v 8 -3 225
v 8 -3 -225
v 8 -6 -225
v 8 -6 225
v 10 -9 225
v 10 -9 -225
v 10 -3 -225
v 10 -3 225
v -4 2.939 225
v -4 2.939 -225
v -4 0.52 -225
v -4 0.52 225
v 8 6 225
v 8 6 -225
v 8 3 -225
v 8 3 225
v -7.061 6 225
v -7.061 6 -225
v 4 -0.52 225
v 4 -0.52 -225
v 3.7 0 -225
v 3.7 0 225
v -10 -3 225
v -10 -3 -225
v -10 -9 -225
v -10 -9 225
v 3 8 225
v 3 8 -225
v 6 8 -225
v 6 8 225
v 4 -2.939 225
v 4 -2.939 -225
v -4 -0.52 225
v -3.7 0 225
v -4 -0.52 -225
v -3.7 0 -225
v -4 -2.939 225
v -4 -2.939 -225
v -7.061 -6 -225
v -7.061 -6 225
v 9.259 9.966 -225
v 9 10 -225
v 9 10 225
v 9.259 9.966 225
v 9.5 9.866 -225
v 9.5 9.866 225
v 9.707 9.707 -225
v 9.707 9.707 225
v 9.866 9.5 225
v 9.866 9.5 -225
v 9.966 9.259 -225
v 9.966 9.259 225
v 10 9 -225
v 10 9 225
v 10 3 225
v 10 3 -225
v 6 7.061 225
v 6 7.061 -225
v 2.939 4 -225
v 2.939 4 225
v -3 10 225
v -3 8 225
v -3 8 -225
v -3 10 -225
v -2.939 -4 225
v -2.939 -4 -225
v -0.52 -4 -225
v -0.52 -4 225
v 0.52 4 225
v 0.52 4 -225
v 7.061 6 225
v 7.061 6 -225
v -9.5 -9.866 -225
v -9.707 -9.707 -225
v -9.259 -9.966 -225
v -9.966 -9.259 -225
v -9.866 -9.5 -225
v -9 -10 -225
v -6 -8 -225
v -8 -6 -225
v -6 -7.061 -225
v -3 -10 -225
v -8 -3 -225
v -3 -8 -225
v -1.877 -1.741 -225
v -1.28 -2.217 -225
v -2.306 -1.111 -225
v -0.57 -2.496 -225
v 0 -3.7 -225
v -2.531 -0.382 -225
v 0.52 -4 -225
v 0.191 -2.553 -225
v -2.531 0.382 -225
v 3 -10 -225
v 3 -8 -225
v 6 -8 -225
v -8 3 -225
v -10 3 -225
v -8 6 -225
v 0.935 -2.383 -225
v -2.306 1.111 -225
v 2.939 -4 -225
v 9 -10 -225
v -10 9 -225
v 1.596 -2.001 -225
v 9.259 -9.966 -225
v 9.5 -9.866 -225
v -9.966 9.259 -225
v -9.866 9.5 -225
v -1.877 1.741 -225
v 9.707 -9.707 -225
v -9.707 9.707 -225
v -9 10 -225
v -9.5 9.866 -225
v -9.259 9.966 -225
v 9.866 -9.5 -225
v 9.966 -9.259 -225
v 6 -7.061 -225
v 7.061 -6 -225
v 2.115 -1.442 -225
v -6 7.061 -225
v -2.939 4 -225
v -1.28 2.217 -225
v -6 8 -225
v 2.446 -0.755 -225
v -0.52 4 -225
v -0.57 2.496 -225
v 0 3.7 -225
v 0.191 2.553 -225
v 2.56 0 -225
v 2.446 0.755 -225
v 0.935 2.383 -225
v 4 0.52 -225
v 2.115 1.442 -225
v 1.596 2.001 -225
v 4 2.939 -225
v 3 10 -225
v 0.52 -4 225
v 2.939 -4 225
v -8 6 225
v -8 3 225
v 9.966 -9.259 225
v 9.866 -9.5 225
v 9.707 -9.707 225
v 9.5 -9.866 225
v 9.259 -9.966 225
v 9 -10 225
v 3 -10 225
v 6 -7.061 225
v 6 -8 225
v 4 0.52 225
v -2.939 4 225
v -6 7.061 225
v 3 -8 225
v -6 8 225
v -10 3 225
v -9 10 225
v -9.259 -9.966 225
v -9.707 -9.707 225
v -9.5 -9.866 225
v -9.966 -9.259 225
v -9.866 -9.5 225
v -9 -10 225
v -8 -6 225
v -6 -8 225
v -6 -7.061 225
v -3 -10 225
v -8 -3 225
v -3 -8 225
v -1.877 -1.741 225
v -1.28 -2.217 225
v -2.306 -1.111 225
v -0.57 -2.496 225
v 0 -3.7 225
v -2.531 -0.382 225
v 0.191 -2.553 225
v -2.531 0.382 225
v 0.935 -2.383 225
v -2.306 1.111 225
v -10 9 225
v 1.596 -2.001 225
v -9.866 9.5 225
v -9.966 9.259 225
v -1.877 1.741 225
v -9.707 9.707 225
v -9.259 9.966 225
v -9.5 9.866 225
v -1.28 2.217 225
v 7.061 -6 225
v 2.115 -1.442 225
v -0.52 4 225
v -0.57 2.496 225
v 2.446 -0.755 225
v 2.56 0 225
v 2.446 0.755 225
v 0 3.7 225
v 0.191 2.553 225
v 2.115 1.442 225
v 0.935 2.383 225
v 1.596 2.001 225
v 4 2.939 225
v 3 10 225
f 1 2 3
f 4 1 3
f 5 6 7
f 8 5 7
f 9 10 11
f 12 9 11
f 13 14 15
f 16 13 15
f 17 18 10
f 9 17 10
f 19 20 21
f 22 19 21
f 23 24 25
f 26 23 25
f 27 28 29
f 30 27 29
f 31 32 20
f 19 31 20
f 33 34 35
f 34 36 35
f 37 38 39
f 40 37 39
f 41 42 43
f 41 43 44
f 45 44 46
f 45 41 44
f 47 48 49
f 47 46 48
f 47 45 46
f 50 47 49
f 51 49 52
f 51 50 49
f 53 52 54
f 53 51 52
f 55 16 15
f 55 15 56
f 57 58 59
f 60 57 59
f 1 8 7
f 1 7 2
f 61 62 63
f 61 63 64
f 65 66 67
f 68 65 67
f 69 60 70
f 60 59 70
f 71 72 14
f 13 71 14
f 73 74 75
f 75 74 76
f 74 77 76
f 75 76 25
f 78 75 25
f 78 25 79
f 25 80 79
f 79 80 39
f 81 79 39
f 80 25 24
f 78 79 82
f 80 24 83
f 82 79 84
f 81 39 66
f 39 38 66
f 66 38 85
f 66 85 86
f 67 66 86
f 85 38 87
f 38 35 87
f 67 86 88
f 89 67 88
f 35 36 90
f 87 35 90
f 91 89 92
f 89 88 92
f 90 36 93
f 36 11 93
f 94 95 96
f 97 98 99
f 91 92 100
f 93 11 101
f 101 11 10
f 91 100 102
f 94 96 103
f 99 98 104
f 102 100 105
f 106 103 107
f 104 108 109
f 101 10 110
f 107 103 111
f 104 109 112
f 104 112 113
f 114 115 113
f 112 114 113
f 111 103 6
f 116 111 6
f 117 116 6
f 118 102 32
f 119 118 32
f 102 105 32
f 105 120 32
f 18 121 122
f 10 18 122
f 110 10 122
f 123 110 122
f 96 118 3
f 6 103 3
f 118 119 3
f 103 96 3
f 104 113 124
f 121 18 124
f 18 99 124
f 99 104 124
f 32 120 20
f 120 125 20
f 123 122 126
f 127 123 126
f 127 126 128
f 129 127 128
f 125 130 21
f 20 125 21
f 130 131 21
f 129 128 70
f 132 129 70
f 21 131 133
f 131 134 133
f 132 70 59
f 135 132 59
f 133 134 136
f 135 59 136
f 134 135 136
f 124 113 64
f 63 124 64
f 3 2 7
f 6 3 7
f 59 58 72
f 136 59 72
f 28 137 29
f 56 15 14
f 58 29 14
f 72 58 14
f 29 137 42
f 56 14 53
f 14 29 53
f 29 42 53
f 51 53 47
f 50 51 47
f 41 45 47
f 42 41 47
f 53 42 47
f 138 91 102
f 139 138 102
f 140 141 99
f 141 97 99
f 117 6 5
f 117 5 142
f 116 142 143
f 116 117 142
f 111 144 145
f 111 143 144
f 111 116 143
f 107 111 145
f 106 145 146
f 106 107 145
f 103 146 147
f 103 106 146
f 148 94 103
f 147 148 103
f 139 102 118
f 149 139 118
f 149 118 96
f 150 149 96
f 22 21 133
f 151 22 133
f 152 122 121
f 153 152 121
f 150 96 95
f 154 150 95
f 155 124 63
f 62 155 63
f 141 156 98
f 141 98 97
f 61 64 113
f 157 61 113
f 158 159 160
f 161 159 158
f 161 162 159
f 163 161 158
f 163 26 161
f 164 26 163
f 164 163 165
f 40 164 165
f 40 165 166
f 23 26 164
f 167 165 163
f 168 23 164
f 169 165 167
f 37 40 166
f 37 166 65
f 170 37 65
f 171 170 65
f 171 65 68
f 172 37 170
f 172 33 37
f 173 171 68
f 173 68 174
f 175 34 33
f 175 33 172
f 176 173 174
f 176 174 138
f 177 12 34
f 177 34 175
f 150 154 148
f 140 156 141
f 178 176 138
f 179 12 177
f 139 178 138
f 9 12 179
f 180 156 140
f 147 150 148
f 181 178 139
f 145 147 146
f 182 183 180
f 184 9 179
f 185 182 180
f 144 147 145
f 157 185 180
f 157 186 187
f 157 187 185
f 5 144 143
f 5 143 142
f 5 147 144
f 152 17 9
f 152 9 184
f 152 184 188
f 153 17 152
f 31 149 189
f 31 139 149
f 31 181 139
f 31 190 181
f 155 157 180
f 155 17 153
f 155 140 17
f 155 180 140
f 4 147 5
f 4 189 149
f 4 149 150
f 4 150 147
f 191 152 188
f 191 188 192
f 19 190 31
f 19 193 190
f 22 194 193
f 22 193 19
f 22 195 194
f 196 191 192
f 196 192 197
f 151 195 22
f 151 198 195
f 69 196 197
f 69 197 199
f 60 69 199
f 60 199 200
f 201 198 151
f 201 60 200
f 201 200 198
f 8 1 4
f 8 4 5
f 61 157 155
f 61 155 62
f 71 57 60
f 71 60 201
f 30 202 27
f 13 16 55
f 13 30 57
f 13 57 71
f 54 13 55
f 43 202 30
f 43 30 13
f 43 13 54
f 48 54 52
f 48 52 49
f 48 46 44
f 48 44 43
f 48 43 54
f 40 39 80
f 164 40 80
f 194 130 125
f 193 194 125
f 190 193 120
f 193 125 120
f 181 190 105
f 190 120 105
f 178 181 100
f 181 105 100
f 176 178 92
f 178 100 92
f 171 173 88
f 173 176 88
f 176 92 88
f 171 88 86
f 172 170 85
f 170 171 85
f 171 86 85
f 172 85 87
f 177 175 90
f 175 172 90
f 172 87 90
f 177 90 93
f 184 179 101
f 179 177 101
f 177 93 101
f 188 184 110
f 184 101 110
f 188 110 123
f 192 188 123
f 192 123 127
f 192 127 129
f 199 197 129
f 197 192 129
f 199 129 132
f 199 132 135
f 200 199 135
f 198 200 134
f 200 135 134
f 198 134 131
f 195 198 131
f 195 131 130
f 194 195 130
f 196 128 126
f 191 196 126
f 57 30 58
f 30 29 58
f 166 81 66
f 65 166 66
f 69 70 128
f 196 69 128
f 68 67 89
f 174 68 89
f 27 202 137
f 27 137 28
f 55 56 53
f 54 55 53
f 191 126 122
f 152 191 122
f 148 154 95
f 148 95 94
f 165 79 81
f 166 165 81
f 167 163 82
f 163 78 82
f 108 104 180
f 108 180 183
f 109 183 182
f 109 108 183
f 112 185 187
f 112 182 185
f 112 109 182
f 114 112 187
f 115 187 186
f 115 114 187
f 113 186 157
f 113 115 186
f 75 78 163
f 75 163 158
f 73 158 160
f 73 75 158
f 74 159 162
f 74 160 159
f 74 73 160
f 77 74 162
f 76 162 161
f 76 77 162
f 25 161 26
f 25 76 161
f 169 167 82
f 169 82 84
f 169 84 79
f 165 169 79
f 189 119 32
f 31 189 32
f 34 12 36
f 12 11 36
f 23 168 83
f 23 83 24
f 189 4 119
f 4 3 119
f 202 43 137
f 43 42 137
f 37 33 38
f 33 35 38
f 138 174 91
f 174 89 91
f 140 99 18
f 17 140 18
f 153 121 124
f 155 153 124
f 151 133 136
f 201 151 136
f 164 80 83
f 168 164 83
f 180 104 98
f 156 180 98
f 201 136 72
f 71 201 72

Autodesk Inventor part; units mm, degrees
ref_plane "YZ Plane" through (0, 0, 0) normal (1, 0, 0) x (0, 1, 0)
ref_plane "XZ Plane" through (0, 0, 0) normal (0, 1, 0) x (-1, 0, 0)
ref_plane "XY Plane" through (0, 0, 0) normal (0, 0, 1) x (1, 0, 0)
sketch "Skizze1" plane through (0, 0, 0) normal (0, 0, 1) x (1, 0, 0)
  line L0 (3.7, 0) -> (4, 0.5196)
  line L1 (4, 0.5196) -> (4, 2.9393)
  line L2 (4, 2.9393) -> (7.0607, 6)
  line L3 (7.0607, 6) -> (8, 6)
  line L4 (8, 6) -> (8, 3)
  line L5 (8, 3) -> (10, 3)
  line L6 (10, 3) -> (10, 9)
  arc A0 (10, 9) -> (9, 10) centre (9, 9) ccw
  line L7 (9, 10) -> (3, 10)
  line L8 (3, 10) -> (3, 8)
  line L9 (3, 8) -> (6, 8)
  line L10 (6, 8) -> (6, 7.0607)
  line L11 (6, 7.0607) -> (2.9393, 4)
  line L12 (2.9393, 4) -> (0.5196, 4)
  line L13 (0.5196, 4) -> (0, 3.7)
  circle A1 centre (0, 0) radius 2.56
  line L14 (0, 0) -> (9.7071, 9.7071) construction
  line L15 (-14.2899, 0) -> (14.2899, 0) construction
  line L16 (0, -14.2899) -> (0, 14.2899) construction
  line L17 (0, 3.7) -> (-0.5196, 4)
  line L18 (-0.5196, 4) -> (-2.9393, 4)
  line L19 (-3, 8) -> (-3, 10)
  line L20 (-4, 0.5196) -> (-3.7, 0)
  line L21 (-4, 2.9393) -> (-4, 0.5196)
  line L22 (-6, 7.0607) -> (-6, 8)
  line L23 (-6, 8) -> (-3, 8)
  line L24 (-7.0607, 6) -> (-4, 2.9393)
  line L25 (0, 0) -> (-9.7071, 9.7071) construction
  line L26 (-8, 6) -> (-7.0607, 6)
  line L27 (-2.9393, 4) -> (-6, 7.0607)
  line L28 (-8, 3) -> (-8, 6)
  line L29 (-10, 3) -> (-8, 3)
  arc A2 (-9, 10) -> (-10, 9) centre (-9, 9) ccw
  line L30 (-10, 9) -> (-10, 3)
  line L31 (-3, 10) -> (-9, 10)
  line L32 (-3.7, 0) -> (-4, -0.5196)
  line L33 (-4, -0.5196) -> (-4, -2.9393)
  line L34 (-8, -3) -> (-10, -3)
  line L35 (-0.5196, -4) -> (0, -3.7)
  line L36 (-2.9393, -4) -> (-0.5196, -4)
  line L37 (-7.0607, -6) -> (-8, -6)
  line L38 (-8, -6) -> (-8, -3)
  line L39 (-6, -7.0607) -> (-2.9393, -4)
  line L40 (0, 0) -> (-9.7071, -9.7071) construction
  line L41 (-6, -8) -> (-6, -7.0607)
  line L42 (-4, -2.9393) -> (-7.0607, -6)
  line L43 (-3, -8) -> (-6, -8)
  line L44 (-3, -10) -> (-3, -8)
  arc A3 (-10, -9) -> (-9, -10) centre (-9, -9) ccw
  line L45 (-9, -10) -> (-3, -10)
  line L46 (-10, -3) -> (-10, -9)
  line L47 (0, -3.7) -> (0.5196, -4)
  line L48 (0.5196, -4) -> (2.9393, -4)
  line L49 (3, -8) -> (3, -10)
  line L50 (4, -0.5196) -> (3.7, 0)
  line L51 (4, -2.9393) -> (4, -0.5196)
  line L52 (6, -7.0607) -> (6, -8)
  line L53 (6, -8) -> (3, -8)
  line L54 (7.0607, -6) -> (4, -2.9393)
  line L55 (0, 0) -> (9.7071, -9.7071) construction
  line L56 (8, -6) -> (7.0607, -6)
  line L57 (2.9393, -4) -> (6, -7.0607)
  line L58 (8, -3) -> (8, -6)
  line L59 (10, -3) -> (8, -3)
  arc A4 (9, -10) -> (10, -9) centre (9, -9) ccw
  line L60 (10, -9) -> (10, -3)
  line L61 (3, -10) -> (9, -10)
  point P0 (-3.7, 0)
  point P1 (0, -3.7)
  dimension "d14" = 1.5
  dimension "d15" = 3
  dimension "d16" = 4
  dimension "d17" = 0.3
  dimension "d18" = 2
  dimension "d19" = 6
  dimension "d20" = 10
  dimension "d21" = 10
  dimension "d22" = 2
  dimension "d23" = 3
  dimension "d24" = 6
  dimension "d25" = 1
  dimension "d26" = 4
  dimension "d27" = 0.3
  dimension "d28" = 0.5196
  dimension "d29" = 0.5196
  dimension "d30" = 5.12
  dimension "d33" = 360
extrude "Extrusion1" add sketch "Skizze1" along normal mid plane 450
properties part number "Extrusion_20x20x450" material "Aluminium 6061"
